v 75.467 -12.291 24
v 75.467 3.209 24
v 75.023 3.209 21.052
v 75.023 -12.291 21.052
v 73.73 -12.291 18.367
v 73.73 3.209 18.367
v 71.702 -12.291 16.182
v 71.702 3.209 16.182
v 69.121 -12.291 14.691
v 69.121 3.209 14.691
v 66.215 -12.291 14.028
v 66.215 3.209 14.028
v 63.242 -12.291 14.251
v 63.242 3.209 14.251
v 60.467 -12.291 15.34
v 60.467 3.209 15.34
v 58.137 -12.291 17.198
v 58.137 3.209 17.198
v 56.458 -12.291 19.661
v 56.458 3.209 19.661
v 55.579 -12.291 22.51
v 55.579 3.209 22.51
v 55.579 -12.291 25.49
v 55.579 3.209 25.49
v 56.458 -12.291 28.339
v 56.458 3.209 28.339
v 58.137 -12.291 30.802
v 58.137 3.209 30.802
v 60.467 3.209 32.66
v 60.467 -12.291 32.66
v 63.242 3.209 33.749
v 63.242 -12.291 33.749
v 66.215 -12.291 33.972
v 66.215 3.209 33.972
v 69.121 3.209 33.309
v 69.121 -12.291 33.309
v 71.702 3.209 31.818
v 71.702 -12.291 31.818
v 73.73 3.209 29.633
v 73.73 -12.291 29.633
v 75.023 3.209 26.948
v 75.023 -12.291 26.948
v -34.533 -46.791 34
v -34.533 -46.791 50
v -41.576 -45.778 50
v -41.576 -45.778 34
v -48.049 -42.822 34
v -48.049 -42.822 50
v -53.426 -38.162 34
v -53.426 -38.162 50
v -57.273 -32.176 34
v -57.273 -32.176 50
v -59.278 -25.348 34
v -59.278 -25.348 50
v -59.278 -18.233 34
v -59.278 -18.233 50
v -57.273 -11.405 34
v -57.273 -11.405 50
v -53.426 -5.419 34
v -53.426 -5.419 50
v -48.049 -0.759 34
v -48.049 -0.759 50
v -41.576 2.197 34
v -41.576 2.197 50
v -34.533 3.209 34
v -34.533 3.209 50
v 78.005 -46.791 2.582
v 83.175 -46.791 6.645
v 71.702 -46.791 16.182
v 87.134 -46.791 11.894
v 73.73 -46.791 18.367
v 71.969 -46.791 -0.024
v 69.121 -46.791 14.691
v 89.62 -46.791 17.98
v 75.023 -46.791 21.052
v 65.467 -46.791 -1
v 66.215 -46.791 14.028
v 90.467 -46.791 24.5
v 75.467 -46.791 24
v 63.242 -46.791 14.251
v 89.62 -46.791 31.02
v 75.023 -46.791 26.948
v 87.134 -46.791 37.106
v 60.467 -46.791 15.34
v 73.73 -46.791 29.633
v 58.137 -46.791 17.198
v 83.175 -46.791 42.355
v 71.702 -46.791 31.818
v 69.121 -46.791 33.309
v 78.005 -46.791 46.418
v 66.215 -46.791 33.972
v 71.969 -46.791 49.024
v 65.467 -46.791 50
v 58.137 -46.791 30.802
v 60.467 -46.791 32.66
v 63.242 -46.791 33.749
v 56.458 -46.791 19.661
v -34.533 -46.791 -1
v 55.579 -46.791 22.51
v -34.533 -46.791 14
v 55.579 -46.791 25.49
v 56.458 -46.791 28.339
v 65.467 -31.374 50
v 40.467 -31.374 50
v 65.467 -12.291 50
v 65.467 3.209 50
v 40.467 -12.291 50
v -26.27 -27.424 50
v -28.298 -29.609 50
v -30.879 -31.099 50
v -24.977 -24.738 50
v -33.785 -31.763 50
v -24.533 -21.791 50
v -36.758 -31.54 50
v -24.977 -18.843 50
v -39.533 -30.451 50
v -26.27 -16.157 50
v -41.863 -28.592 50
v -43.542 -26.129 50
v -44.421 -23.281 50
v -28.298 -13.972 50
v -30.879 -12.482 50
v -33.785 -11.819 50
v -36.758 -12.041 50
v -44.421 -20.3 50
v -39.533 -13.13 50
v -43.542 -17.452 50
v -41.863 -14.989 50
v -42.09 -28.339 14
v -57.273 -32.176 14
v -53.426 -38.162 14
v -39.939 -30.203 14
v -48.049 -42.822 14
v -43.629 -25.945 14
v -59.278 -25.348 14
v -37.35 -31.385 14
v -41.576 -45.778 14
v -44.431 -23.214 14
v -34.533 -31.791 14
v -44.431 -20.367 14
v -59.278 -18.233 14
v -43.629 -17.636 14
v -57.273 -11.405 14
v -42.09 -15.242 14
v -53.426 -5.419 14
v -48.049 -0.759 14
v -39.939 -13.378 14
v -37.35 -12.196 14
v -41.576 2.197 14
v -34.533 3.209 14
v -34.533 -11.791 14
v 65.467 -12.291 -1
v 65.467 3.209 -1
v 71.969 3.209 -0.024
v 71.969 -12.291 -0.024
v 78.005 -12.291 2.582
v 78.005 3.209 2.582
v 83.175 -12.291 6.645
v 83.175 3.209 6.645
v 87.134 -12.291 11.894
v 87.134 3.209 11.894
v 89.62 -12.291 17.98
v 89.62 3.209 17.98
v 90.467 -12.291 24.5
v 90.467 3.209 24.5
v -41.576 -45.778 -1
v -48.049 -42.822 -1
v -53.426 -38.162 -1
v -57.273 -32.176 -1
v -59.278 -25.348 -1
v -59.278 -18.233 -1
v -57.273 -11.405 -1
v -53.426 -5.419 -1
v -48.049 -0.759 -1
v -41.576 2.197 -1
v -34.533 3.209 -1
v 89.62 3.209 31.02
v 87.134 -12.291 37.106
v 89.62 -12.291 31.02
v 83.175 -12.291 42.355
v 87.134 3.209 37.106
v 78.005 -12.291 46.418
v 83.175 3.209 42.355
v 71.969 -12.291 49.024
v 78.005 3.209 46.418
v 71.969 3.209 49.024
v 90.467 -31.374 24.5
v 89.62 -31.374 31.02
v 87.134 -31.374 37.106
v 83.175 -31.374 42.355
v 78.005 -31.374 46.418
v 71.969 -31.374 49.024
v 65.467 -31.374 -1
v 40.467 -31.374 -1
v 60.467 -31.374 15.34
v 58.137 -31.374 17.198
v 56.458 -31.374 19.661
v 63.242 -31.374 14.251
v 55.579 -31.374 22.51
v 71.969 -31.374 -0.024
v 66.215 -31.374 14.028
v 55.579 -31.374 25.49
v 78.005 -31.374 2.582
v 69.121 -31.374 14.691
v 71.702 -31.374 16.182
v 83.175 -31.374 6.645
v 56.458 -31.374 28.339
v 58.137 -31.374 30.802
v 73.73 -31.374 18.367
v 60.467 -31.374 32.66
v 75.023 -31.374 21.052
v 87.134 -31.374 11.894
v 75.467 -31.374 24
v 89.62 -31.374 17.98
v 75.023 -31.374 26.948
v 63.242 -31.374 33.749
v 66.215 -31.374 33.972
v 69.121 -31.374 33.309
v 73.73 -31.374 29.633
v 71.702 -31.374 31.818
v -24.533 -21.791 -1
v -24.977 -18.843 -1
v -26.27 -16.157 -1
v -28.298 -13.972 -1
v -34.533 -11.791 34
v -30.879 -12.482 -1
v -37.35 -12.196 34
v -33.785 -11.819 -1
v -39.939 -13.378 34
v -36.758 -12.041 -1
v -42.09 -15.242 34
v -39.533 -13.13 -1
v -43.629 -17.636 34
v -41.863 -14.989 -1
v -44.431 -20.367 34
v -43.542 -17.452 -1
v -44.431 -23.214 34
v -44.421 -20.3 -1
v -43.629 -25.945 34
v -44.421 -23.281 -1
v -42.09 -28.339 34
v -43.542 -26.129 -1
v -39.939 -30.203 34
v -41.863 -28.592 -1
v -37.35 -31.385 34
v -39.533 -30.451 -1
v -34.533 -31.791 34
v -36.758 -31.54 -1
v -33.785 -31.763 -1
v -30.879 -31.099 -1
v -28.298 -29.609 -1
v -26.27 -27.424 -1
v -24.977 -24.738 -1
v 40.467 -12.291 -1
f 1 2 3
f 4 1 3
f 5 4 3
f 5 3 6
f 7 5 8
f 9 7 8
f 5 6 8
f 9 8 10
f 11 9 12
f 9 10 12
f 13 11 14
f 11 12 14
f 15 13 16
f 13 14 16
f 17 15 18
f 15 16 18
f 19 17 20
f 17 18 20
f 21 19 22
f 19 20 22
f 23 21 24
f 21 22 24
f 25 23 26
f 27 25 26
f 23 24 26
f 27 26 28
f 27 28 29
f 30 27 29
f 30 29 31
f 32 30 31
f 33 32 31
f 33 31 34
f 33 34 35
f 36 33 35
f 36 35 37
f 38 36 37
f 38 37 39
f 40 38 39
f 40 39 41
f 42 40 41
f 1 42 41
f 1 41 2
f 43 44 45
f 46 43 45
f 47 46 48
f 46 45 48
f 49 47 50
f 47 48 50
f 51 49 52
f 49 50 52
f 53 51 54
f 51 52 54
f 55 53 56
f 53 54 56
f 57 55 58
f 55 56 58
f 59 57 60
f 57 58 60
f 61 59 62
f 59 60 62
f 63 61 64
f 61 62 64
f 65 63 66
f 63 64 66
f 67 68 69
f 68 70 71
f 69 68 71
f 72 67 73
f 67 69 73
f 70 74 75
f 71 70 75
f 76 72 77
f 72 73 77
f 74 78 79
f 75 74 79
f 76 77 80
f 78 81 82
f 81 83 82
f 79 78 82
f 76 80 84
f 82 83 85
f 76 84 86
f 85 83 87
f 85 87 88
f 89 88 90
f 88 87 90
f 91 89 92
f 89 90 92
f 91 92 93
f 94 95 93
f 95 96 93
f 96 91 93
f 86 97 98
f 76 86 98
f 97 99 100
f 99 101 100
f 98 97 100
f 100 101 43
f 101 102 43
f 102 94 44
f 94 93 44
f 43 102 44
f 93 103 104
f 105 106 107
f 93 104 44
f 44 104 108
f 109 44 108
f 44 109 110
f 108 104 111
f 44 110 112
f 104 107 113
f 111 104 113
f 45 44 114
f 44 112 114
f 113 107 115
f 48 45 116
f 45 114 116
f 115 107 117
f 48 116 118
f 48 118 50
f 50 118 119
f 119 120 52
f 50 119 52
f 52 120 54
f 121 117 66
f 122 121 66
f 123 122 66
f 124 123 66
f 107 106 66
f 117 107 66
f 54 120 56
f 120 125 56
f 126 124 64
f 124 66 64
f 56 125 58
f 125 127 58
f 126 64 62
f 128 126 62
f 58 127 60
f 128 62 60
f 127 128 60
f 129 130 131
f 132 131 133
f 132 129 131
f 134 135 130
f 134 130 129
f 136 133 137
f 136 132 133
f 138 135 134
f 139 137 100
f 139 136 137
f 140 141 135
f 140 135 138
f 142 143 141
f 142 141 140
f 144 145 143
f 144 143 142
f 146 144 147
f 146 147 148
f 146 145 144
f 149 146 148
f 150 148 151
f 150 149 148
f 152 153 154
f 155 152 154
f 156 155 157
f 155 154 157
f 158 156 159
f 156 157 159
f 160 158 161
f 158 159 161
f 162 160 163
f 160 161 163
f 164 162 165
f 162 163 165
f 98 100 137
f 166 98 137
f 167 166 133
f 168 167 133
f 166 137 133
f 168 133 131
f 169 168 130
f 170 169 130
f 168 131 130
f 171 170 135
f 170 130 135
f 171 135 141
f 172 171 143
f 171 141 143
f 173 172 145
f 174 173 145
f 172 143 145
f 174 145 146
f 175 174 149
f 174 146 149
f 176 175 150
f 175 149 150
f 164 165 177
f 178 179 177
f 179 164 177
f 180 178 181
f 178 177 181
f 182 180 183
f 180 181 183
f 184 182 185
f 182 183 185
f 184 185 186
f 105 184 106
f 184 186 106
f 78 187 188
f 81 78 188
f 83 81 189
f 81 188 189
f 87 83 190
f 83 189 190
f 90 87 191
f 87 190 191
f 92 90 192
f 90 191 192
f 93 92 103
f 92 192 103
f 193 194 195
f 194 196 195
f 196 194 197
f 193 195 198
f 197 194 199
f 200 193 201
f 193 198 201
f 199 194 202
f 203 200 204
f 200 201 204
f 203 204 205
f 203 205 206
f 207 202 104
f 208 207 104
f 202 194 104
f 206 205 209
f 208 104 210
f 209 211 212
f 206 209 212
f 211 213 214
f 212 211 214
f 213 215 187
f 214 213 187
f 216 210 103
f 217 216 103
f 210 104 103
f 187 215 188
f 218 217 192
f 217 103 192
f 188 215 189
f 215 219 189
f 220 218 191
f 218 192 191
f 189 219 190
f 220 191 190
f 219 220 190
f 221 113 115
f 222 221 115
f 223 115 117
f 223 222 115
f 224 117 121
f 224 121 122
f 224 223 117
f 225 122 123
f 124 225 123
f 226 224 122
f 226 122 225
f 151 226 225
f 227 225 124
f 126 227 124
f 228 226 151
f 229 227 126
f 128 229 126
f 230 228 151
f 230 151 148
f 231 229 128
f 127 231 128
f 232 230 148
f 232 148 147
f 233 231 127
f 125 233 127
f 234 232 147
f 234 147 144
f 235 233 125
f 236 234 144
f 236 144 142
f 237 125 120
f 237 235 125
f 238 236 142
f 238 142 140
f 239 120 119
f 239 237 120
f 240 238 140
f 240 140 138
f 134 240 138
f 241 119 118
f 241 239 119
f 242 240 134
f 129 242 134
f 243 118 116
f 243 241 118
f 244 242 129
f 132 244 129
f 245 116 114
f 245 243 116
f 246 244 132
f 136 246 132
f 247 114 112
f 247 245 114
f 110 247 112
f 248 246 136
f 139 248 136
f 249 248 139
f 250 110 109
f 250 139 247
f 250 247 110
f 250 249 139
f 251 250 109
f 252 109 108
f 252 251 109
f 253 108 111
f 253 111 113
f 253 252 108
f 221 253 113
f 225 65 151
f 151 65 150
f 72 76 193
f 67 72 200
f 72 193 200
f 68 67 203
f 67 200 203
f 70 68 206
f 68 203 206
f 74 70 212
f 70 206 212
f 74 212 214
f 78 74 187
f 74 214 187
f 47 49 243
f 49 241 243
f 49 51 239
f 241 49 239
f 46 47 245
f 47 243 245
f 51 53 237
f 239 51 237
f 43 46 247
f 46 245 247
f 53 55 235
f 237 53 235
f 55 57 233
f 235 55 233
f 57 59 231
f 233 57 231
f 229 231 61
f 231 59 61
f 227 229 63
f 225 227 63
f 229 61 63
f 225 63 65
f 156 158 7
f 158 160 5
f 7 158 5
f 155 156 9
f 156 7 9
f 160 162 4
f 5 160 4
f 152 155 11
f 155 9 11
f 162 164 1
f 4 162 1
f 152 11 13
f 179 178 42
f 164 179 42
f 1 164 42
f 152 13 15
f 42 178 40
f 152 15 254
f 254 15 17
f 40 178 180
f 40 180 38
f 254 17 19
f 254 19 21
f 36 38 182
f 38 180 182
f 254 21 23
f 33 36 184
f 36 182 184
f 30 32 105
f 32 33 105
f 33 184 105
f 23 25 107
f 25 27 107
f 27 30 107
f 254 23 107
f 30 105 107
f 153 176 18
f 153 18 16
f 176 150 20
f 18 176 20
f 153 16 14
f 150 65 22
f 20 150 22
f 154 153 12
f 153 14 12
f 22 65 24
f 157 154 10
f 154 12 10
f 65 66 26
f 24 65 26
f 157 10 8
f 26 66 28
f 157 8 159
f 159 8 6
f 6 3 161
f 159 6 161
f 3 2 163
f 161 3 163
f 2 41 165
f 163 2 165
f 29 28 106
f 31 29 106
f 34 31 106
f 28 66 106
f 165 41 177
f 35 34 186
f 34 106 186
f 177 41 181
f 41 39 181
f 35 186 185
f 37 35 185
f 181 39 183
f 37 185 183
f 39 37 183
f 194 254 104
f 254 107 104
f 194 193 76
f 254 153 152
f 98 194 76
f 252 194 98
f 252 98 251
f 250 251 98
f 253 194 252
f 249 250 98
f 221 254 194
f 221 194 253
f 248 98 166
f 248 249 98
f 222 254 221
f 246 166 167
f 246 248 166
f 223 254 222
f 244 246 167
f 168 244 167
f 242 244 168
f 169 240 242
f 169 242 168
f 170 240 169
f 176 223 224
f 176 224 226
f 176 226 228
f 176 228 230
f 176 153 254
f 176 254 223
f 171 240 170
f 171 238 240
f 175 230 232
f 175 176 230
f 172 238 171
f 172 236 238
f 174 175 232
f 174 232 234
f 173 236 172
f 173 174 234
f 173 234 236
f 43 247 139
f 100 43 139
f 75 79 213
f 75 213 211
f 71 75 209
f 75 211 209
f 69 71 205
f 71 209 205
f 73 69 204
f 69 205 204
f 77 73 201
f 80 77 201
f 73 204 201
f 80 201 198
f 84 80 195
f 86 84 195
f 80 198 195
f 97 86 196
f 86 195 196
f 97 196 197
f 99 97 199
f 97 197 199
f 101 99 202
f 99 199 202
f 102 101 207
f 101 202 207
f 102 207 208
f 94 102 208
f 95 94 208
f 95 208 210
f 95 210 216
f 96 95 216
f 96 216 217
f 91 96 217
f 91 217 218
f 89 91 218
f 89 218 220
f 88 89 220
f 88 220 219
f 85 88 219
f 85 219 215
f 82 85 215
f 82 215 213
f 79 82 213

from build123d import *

# Parameters (mm, degrees)
SKETCH1_R                = 10
BOSS_EXTRUDE1_DEPTH      = 50
BOSS_EXTRUDE1_DEPTH_BACK = 1
SKETCH2_W                = 25
SKETCH2_H                = 20
SKETCH2_R                = 10
CUT_EXTRUDE3_DEPTH       = 50


with BuildPart() as part:
    # Sketch1 → Boss-Extrude1 (new body, two sides)
    with BuildSketch(Plane.XY) as boss_extrude1_sk:
        with BuildLine():
            Line((90.467312071, -12.290554593), (40.467312071, -12.290554593))
            Line((40.467312071, -12.290554593), (40.467312071, -31.373570191))
            Line((40.467312071, -31.373570191), (90.467312071, -31.373570191))
            Line((90.467312071, -31.373570191), (90.467312071, -46.790554593))
            Line((90.467312071, -46.790554593), (-34.532687929, -46.790554593))
            ThreePointArc((-34.532687929, -46.790554593), (-59.532687929, -21.790554593), (-34.532687929, 3.209445407))
            Line((-34.532687929, 3.209445407), (90.467312071, 3.209445407))
            Line((90.467312071, 3.209445407), (90.467312071, -12.290554593))
        make_face()
        with Locations((-34.532687929, -21.790554593)):
            Circle(SKETCH1_R, mode=Mode.SUBTRACT)
    extrude(amount=BOSS_EXTRUDE1_DEPTH)
    extrude(boss_extrude1_sk.sketch, amount=-BOSS_EXTRUDE1_DEPTH_BACK)

    # Sketch2 → Cut-Extrude3 (cut)
    with BuildSketch(Plane(origin=(0, 3.209445407, 0), x_dir=(1, 0, 0), z_dir=(0, 1, 0))):
        with Locations((-47.032687929, -24)):
            Rectangle(SKETCH2_W, SKETCH2_H)
        with Locations((65.467312071, -24)):
            Circle(SKETCH2_R)
        with BuildLine():
            ThreePointArc((90.467312071, -24.5), (83.174739834, -42.355321336), (65.467312071, -50))
            Line((65.467312071, -50), (90.467312071, -50))
            Line((90.467312071, -50), (90.467312071, -24.5))
        make_face()
        with BuildLine():
            Line((90.467312071, 1), (65.467312071, 1))
            ThreePointArc((65.467312071, 1), (83.174739834, -6.644678664), (90.467312071, -24.5))
            Line((90.467312071, -24.5), (90.467312071, 1))
        make_face()
    extrude(amount=-CUT_EXTRUDE3_DEPTH, mode=Mode.SUBTRACT)


solid = part.part
